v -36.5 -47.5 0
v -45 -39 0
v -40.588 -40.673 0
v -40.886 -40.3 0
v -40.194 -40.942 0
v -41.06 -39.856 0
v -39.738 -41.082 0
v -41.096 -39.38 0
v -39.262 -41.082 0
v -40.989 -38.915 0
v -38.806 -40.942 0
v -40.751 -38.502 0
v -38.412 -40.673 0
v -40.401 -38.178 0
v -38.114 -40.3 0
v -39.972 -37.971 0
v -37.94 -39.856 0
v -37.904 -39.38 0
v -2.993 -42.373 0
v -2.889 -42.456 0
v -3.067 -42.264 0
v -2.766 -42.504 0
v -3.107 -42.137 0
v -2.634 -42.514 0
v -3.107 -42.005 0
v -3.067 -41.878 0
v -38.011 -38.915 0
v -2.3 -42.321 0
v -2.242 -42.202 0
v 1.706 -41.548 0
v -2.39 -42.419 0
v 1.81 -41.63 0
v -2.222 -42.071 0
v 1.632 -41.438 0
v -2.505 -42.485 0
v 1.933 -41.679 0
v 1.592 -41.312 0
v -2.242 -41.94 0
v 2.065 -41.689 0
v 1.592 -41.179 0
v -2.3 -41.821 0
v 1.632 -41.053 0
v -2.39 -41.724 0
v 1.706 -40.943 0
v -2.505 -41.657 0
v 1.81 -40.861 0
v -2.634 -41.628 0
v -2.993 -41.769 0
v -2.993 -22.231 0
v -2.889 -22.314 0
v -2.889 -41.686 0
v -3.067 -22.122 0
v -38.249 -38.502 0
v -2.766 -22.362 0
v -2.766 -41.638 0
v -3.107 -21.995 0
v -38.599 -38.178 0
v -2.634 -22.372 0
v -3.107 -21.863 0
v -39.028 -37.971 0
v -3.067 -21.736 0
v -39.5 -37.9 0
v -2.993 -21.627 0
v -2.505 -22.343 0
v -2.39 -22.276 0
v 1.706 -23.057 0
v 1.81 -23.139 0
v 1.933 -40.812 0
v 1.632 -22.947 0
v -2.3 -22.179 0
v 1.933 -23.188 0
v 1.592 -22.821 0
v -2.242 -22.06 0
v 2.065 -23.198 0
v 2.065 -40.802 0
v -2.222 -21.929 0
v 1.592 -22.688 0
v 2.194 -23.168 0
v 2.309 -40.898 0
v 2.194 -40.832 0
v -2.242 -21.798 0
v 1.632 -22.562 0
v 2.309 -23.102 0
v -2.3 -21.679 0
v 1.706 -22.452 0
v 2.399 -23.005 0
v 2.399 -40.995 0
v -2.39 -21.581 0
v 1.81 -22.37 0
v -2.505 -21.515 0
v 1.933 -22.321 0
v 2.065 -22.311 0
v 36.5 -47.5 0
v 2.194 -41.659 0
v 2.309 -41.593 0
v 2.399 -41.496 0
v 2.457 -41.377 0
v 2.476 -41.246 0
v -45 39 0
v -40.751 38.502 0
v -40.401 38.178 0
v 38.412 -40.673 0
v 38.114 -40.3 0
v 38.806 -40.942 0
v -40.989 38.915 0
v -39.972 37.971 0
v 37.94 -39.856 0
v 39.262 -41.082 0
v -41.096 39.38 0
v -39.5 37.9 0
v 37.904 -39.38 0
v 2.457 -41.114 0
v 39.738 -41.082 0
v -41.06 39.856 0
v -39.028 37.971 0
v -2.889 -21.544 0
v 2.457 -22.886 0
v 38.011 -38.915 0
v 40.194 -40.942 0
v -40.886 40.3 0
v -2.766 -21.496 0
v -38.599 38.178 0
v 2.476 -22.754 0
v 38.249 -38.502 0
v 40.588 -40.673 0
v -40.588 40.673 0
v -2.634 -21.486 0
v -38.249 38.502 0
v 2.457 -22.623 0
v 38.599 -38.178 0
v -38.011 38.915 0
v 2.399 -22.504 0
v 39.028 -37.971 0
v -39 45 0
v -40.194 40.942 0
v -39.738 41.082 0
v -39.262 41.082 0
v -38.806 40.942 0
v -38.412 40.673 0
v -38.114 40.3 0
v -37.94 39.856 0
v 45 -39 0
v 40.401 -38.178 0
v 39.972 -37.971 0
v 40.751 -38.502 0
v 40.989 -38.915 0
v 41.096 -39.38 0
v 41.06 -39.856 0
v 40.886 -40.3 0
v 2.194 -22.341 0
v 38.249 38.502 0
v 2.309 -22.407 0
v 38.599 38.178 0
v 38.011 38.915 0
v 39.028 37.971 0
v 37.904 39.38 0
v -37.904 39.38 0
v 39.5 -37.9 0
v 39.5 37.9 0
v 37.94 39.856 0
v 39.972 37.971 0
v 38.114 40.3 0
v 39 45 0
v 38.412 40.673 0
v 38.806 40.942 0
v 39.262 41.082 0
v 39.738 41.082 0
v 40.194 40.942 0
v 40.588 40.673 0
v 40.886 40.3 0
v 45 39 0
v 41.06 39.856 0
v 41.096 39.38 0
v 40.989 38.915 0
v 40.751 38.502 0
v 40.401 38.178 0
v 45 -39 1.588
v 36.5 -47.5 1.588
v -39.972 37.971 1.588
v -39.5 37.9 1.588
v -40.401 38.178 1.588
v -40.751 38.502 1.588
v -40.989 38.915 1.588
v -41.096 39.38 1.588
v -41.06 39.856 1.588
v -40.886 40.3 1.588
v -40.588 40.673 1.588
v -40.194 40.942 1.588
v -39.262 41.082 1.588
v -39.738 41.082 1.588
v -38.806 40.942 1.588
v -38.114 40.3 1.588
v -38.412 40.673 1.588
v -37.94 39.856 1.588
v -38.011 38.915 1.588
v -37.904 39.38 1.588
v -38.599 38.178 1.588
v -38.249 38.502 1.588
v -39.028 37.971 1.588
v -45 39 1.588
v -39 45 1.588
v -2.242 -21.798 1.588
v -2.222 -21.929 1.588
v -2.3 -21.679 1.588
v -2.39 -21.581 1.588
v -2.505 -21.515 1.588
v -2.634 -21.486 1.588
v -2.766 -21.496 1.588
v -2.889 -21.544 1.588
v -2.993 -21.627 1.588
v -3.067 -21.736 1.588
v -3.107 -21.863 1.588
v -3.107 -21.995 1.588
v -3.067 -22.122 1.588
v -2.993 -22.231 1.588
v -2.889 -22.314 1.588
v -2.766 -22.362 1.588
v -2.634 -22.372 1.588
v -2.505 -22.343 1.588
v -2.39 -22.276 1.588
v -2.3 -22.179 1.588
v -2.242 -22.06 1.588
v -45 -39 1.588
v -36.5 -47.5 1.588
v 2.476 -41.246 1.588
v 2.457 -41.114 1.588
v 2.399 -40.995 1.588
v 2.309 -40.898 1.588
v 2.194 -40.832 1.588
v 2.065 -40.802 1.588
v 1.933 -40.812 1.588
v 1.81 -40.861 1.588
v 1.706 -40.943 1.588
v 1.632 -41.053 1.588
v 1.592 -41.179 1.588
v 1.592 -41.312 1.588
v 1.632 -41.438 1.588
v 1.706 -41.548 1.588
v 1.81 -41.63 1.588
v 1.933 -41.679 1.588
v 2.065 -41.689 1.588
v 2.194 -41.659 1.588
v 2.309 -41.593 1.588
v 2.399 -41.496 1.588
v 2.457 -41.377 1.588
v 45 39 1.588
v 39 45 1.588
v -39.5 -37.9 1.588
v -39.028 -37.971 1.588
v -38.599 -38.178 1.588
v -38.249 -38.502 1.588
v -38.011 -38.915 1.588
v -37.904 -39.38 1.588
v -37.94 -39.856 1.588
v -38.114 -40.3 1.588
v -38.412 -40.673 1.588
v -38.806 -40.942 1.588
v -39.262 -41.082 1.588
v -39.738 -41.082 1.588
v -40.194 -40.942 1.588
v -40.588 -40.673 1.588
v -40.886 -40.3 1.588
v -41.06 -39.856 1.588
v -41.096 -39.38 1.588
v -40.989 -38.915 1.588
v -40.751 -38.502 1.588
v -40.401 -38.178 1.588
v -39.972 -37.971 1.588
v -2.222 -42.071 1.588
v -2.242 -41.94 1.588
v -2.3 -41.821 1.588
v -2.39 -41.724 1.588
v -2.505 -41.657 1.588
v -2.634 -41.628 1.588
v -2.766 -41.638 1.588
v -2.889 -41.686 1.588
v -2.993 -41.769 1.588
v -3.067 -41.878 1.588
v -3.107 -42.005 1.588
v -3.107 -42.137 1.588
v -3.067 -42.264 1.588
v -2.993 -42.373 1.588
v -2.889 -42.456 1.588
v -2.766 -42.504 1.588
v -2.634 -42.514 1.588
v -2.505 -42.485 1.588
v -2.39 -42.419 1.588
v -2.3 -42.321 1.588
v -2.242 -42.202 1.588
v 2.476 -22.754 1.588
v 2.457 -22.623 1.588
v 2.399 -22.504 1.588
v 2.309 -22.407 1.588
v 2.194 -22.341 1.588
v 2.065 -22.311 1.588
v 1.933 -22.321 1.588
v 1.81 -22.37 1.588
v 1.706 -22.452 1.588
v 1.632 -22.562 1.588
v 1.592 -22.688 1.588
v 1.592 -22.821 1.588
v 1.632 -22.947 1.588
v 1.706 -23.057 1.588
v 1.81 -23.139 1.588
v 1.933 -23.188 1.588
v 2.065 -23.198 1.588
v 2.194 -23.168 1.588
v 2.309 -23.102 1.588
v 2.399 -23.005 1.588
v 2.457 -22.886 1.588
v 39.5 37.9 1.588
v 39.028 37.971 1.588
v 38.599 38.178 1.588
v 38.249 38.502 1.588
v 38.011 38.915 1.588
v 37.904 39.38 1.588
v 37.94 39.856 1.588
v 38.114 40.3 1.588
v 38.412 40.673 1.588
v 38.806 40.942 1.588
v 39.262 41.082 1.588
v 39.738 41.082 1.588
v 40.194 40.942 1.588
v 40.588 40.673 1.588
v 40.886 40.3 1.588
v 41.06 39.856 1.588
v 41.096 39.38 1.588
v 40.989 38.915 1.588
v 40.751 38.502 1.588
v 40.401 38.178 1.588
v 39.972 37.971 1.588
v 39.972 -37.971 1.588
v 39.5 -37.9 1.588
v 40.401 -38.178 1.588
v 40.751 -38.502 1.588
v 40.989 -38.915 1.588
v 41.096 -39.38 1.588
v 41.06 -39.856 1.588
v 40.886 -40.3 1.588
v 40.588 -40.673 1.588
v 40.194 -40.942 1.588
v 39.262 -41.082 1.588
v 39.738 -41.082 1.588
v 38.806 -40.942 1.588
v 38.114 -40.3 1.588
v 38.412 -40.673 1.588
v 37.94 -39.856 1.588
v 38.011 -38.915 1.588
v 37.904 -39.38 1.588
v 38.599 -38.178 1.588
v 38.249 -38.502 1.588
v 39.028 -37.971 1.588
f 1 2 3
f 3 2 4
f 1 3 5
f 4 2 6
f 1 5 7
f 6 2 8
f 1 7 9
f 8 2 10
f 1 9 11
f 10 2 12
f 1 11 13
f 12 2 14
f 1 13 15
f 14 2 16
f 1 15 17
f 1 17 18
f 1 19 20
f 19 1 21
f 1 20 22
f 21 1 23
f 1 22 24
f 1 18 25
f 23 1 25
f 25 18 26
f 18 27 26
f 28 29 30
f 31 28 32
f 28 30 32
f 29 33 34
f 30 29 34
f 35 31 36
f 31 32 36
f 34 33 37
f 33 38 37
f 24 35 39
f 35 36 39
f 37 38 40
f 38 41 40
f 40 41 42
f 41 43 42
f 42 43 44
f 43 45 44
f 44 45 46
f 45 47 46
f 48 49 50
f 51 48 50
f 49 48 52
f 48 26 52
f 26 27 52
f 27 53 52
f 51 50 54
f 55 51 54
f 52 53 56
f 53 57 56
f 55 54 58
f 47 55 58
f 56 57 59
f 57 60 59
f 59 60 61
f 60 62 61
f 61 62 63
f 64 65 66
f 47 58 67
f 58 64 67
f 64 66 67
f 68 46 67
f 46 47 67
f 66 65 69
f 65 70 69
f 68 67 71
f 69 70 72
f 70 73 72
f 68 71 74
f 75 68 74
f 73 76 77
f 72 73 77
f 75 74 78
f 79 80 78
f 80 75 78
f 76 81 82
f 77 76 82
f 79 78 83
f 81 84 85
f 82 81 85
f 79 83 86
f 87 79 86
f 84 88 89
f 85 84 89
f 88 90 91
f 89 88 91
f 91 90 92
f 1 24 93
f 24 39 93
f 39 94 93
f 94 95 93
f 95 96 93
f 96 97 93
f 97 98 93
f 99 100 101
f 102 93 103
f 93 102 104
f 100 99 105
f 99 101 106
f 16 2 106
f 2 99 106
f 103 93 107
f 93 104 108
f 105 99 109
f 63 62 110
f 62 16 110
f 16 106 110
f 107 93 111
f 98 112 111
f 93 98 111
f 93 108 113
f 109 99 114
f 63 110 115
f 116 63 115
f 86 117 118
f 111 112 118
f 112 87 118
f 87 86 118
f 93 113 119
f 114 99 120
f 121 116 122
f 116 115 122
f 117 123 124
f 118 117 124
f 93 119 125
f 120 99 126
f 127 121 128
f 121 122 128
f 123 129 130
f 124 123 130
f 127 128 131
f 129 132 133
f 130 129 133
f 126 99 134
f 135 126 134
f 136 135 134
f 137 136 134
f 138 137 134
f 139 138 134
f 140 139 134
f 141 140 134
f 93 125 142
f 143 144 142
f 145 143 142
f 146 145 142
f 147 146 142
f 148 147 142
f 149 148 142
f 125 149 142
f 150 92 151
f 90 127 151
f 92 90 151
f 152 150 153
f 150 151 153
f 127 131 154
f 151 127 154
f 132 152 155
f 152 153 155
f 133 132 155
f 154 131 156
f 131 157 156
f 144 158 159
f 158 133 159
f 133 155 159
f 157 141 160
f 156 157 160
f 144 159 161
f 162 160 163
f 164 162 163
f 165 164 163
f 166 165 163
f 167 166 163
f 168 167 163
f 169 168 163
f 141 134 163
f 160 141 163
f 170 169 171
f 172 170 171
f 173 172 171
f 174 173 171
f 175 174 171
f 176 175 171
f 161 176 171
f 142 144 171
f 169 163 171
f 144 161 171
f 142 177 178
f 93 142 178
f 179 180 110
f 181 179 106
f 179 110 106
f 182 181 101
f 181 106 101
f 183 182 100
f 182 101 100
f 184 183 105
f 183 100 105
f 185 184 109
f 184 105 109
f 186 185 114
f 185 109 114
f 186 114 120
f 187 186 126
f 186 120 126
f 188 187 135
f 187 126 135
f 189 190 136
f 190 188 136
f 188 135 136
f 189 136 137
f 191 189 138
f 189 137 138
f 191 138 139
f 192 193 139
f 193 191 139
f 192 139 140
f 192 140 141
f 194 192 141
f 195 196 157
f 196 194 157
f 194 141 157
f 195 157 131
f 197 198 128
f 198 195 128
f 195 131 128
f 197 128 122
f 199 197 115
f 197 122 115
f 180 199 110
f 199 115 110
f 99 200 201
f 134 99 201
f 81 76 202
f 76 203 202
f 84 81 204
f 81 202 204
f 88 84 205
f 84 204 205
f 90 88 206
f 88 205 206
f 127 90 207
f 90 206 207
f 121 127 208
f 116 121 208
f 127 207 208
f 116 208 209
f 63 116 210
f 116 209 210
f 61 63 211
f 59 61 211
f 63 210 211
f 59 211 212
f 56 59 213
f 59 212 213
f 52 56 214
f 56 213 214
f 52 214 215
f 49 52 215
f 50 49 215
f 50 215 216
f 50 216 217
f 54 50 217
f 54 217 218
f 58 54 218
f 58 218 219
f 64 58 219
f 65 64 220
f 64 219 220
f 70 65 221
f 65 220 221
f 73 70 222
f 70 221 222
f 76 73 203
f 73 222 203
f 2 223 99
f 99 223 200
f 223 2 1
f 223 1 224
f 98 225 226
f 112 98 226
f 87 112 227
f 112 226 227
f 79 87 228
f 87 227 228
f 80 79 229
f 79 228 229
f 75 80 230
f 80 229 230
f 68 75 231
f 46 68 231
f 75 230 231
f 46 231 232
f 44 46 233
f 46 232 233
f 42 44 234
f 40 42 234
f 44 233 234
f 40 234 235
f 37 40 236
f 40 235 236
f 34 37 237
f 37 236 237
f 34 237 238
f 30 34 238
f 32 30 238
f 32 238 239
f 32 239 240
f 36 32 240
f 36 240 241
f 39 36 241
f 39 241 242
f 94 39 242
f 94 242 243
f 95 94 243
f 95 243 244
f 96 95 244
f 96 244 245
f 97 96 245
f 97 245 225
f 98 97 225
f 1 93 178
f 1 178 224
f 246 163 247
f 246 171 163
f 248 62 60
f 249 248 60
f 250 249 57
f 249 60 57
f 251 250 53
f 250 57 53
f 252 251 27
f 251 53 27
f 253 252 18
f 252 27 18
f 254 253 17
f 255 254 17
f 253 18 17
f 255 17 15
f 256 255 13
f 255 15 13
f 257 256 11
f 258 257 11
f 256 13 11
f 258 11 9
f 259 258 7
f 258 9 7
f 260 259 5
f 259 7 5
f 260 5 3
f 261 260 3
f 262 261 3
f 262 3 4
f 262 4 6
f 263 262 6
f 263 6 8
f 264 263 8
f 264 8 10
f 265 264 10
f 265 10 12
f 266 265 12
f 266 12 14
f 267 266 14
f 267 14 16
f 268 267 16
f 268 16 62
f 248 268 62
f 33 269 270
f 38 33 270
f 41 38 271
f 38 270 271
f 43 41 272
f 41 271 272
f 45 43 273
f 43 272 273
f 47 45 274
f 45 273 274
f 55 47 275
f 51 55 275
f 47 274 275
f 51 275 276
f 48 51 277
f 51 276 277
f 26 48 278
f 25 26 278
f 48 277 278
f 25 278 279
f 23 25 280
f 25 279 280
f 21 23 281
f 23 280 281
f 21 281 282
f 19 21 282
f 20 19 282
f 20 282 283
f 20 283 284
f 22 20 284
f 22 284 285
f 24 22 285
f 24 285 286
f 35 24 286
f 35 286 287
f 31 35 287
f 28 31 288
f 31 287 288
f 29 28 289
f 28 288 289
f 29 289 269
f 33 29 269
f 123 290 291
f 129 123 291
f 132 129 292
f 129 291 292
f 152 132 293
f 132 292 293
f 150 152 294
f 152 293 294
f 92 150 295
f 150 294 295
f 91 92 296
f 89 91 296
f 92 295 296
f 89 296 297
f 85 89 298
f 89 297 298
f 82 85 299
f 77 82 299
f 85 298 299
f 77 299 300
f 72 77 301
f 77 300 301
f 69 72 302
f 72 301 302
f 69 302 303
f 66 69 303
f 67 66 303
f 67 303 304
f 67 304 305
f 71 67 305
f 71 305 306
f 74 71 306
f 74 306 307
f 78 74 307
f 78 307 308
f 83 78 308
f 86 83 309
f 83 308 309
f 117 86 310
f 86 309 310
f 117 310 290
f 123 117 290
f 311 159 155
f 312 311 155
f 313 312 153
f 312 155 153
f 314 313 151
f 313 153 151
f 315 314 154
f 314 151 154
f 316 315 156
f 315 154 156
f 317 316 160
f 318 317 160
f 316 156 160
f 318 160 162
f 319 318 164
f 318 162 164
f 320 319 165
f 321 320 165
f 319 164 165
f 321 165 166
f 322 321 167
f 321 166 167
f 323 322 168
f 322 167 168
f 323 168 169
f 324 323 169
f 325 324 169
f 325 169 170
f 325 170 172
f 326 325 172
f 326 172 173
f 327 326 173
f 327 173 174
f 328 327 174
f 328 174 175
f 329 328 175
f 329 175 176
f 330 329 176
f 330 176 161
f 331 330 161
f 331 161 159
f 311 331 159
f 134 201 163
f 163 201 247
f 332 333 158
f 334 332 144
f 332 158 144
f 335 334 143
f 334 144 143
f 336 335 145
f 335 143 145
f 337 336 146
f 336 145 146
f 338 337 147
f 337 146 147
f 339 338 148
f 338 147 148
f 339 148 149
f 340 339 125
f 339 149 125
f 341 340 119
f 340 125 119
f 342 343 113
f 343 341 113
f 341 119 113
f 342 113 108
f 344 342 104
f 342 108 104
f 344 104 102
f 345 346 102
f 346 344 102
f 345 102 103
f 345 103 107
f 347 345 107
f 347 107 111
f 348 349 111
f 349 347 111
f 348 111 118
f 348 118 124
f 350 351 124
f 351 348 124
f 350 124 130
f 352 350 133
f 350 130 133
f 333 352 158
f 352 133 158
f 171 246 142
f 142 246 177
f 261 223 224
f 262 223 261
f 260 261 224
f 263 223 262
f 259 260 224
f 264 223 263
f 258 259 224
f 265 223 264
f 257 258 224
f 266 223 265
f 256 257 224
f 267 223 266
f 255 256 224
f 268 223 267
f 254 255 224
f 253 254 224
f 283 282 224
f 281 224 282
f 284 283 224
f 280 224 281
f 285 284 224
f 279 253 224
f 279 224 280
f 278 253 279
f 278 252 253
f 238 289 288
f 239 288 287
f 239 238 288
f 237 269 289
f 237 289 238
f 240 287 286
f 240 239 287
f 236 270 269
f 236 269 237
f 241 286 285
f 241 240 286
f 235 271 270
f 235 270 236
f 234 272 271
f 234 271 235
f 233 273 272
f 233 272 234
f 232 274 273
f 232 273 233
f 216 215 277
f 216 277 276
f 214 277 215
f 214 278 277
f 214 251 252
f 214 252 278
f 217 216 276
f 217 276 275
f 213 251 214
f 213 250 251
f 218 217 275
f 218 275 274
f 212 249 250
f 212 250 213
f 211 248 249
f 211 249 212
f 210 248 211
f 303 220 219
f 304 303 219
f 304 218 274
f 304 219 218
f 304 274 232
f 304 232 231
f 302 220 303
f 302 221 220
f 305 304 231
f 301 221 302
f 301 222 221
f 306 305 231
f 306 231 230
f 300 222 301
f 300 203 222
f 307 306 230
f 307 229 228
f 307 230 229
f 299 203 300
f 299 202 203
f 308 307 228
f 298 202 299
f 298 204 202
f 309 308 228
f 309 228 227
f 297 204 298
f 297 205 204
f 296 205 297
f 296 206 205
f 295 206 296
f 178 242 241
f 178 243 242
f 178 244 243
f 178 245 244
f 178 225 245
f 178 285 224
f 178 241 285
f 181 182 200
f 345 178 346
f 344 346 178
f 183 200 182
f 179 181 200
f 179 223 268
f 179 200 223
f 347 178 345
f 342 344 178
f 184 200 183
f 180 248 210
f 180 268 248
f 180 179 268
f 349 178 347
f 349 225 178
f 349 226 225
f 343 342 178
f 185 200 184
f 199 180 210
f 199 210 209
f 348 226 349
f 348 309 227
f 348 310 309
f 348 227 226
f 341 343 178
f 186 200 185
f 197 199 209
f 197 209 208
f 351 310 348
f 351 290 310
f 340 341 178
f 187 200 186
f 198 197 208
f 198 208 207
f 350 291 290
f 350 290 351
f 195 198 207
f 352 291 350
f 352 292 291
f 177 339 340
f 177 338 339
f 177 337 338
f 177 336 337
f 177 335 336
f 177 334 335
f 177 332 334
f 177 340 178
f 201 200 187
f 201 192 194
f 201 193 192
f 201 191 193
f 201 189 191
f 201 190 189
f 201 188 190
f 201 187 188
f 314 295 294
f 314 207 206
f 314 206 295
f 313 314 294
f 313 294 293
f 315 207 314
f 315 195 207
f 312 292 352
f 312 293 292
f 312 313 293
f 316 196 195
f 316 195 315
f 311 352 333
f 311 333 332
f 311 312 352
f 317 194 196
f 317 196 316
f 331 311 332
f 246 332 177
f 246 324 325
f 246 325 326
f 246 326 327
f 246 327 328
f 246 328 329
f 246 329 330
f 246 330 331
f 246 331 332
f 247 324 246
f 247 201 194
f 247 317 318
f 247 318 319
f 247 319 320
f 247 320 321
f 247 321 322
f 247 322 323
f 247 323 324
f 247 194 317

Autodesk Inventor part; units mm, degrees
sketch "AL_spacer_contact_Zminus" plane through (0, 0, 0) normal (0, 0, 1) x (1, 0, 0)
  circle A0 centre (39.5, 39.5) radius 3.175
  circle A1 centre (39.5, -39.5) radius 3.175
  circle A2 centre (-39.5, -39.5) radius 3.175
  circle A3 centre (-39.5, 39.5) radius 3.175
  point P0 (0, 0)
  dimension "d228" = 39.5
  dimension "d229" = 39.5
  dimension "d230" = 39.5
  dimension "d231" = 39.5
  dimension "d232" = 39.5
  dimension "d233" = 39.5
  dimension "d234" = 39.5
  dimension "d235" = 39.5
  dimension "d236" = 6.35
sketch "Delrin_stayout_Zminus" plane through (0, 0, 0) normal (0, 0, 1) x (1, 0, 0)
  line L0 (47.5, 39.5) -> (47.5, 31)
  line L1 (47.5, 31) -> (39.5, 31)
  line L2 (39.5, 31) -> (31, 39.5)
  line L3 (31, 39.5) -> (31, 47.5)
  line L4 (31, 47.5) -> (39.5, 47.5)
  line L5 (39.5, 47.5) -> (47.5, 39.5)
  line L6 (-39.5, 47.5) -> (-47.5, 39.5)
  line L7 (-47.5, 39.5) -> (-47.5, 31)
  line L8 (-47.5, 31) -> (-39.5, 31)
  line L9 (-39.5, 31) -> (-31, 39.5)
  line L10 (-31, 39.5) -> (-31, 47.5)
  line L11 (-31, 47.5) -> (-39.5, 47.5)
  line L12 (47.5, -39.5) -> (39.5, -47.5)
  line L13 (39.5, -47.5) -> (31, -47.5)
  line L14 (31, -47.5) -> (31, -39.5)
  line L15 (31, -39.5) -> (39.5, -31)
  line L16 (39.5, -31) -> (47.5, -31)
  line L17 (47.5, -31) -> (47.5, -39.5)
  line L18 (-39.5, -47.5) -> (-47.5, -39.5)
  line L19 (-47.5, -39.5) -> (-47.5, -31)
  line L20 (-47.5, -31) -> (-39.5, -31)
  line L21 (-39.5, -31) -> (-31, -39.5)
  line L22 (-31, -39.5) -> (-31, -47.5)
  line L23 (-31, -47.5) -> (-39.5, -47.5)
  point P0 (0, 0)
  dimension "d243" = 16.5
  dimension "d244" = 8
  dimension "d245" = 8.5
  dimension "d246" = 16.5
  dimension "d247" = 47.5
  dimension "d248" = 47.5
  dimension "d249" = 47.5
  dimension "d250" = 47.5
  dimension "d251" = 47.5
  dimension "d252" = 47.5
  dimension "d253" = 47.5
  dimension "d254" = 47.5
sketch "Nub_stayout_Zminus" plane through (0, 0, 0) normal (0, 0, 1) x (1, 0, 0)
  line L0 (29, 47.5) -> (39.5, 47.5)
  line L1 (39.5, 47.5) -> (47.5, 39.5)
  line L2 (47.5, 39.5) -> (47.5, 29)
  line L3 (47.5, 29) -> (42, 29)
  line L4 (42, 29) -> (42, 40.4125)
  line L5 (40.4125, 42) -> (29, 42)
  line L6 (29, 42) -> (29, 47.5)
  arc A0 (42, 40.4125) -> (40.4125, 42) centre (40.4125, 40.4125) ccw
  line L7 (-29, 47.5) -> (-39.5, 47.5)
  line L8 (-39.5, 47.5) -> (-47.5, 39.5)
  line L9 (-47.5, 39.5) -> (-47.5, 29)
  line L10 (-47.5, 29) -> (-42, 29)
  line L11 (-42, 29) -> (-42, 40.4125)
  line L12 (-40.4125, 42) -> (-29, 42)
  line L13 (-29, 42) -> (-29, 47.5)
  arc A1 (-40.4125, 42) -> (-42, 40.4125) centre (-40.4125, 40.4125) ccw
  line L14 (-47.5, -29) -> (-42, -29)
  line L15 (-42, -29) -> (-42, -40.4125)
  line L16 (-40.4125, -42) -> (-29, -42)
  line L17 (-29, -42) -> (-29, -47.5)
  line L18 (-29, -47.5) -> (-39.5, -47.5)
  line L19 (-39.5, -47.5) -> (-47.5, -39.5)
  line L20 (-47.5, -39.5) -> (-47.5, -29)
  arc A2 (-42, -40.4125) -> (-40.4125, -42) centre (-40.4125, -40.4125) ccw
  line L21 (47.5, -29) -> (42, -29)
  line L22 (42, -29) -> (42, -40.4125)
  line L23 (40.4125, -42) -> (29, -42)
  line L24 (29, -42) -> (29, -47.5)
  line L25 (29, -47.5) -> (39.5, -47.5)
  line L26 (39.5, -47.5) -> (47.5, -39.5)
  line L27 (47.5, -39.5) -> (47.5, -29)
  arc A3 (40.4125, -42) -> (42, -40.4125) centre (40.4125, -40.4125) ccw
  point P0 (0, 0)
  dimension "d255" = 1.5875
  dimension "d256" = 18.5
  dimension "d257" = 8
  dimension "d258" = 5.5
  dimension "d259" = 47.5
  dimension "d260" = 47.5
  dimension "d264" = 1.5875
  dimension "d265" = 47.5
  dimension "d266" = 47.5
  dimension "d267" = 1.5875
  dimension "d268" = 47.5
  dimension "d269" = 47.5
  dimension "d270" = 1.5875
  dimension "d271" = 47.5
  dimension "d272" = 47.5
ref_plane "Zplus_face" through (0, 0, 1.5875) normal (0, 0, 1) x (1, 0, 0)
sketch "AL_spacer_contact_Zplus" plane through (0, 0, 1.5875) normal (0, 0, 1) x (1, 0, 0)
  circle A0 centre (-39.5, 39.5) radius 3.175
  circle A1 centre (-39.5, -39.5) radius 3.175
  circle A2 centre (39.5, -39.5) radius 3.175
  circle A3 centre (39.5, 39.5) radius 3.175
  point P0 (0, 0)
  dimension "d129" = 39.5
  dimension "d130" = 39.5
  dimension "d131" = 39.5
  dimension "d132" = 39.5
  dimension "d133" = 6.35
sketch "Delrin_stayout_Zplus" plane through (0, 0, 1.5875) normal (0, 0, 1) x (1, 0, 0)
  line L0 (47.5, -31) -> (47.5, -39.5)
  line L1 (47.5, -39.5) -> (39.5, -47.5)
  line L2 (39.5, -47.5) -> (31, -47.5)
  line L3 (31, -47.5) -> (31, -39.5)
  line L4 (31, -39.5) -> (39.5, -31)
  line L5 (39.5, -31) -> (47.5, -31)
  line L6 (47.5, 31) -> (47.5, 39.5)
  line L7 (47.5, 39.5) -> (39.5, 47.5)
  line L8 (39.5, 47.5) -> (31, 47.5)
  line L9 (31, 47.5) -> (31, 39.5)
  line L10 (31, 39.5) -> (39.5, 31)
  line L11 (39.5, 31) -> (47.5, 31)
  line L12 (-39.5, 47.5) -> (-47.5, 39.5)
  line L13 (-47.5, 39.5) -> (-47.5, 31)
  line L14 (-47.5, 31) -> (-39.5, 31)
  line L15 (-39.5, 31) -> (-31, 39.5)
  line L16 (-31, 39.5) -> (-31, 47.5)
  line L17 (-31, 47.5) -> (-39.5, 47.5)
  line L18 (-47.5, -39.5) -> (-39.5, -47.5)
  line L19 (-39.5, -47.5) -> (-31, -47.5)
  line L20 (-31, -47.5) -> (-31, -39.5)
  line L21 (-31, -39.5) -> (-39.5, -31)
  line L22 (-39.5, -31) -> (-47.5, -31)
  line L23 (-47.5, -31) -> (-47.5, -39.5)
  point P0 (0, 0)
  dimension "d115" = 16.5
  dimension "d116" = 16.5
  dimension "d117" = 8
  dimension "d118" = 8.5
  dimension "d121" = 47.5
  dimension "d122" = 47.5
  dimension "d123" = 47.5
  dimension "d124" = 47.5
  dimension "d125" = 47.5
  dimension "d126" = 47.5
  dimension "d127" = 47.5
  dimension "d128" = 47.5
sketch "Nub_stayout_Zplus" plane through (0, 0, 1.5875) normal (0, 0, 1) x (1, 0, 0)
  line L0 (47.5, 29) -> (42, 29)
  line L1 (42, 29) -> (42, 40.4125)
  line L2 (40.4125, 42) -> (29, 42)
  line L3 (29, 42) -> (29, 47.5)
  arc A0 (42, 40.4125) -> (40.4125, 42) centre (40.4125, 40.4125) ccw
  line L4 (29, 47.5) -> (39.5, 47.5)
  line L5 (39.5, 47.5) -> (47.5, 39.5)
  line L6 (47.5, 39.5) -> (47.5, 29)
  line L7 (-39.5, 47.5) -> (-29, 47.5)
  line L8 (-29, 47.5) -> (-29, 42)
  line L9 (-29, 42) -> (-40.4125, 42)
  line L10 (-42, 40.4125) -> (-42, 29)
  line L11 (-42, 29) -> (-47.5, 29)
  line L12 (-47.5, 29) -> (-47.5, 39.5)
  line L13 (-47.5, 39.5) -> (-39.5, 47.5)
  arc A1 (-40.4125, 42) -> (-42, 40.4125) centre (-40.4125, 40.4125) ccw
  line L14 (-47.5, -29) -> (-47.5, -39.5)
  line L15 (-47.5, -39.5) -> (-39.5, -47.5)
  line L16 (-39.5, -47.5) -> (-29, -47.5)
  line L17 (-29, -47.5) -> (-29, -42)
  line L18 (-29, -42) -> (-40.4125, -42)
  line L19 (-42, -40.4125) -> (-42, -29)
  line L20 (-42, -29) -> (-47.5, -29)
  arc A2 (-42, -40.4125) -> (-40.4125, -42) centre (-40.4125, -40.4125) ccw
  line L21 (29, -47.5) -> (39.5, -47.5)
  line L22 (39.5, -47.5) -> (47.5, -39.5)
  line L23 (47.5, -39.5) -> (47.5, -29)
  line L24 (47.5, -29) -> (42, -29)
  line L25 (42, -29) -> (42, -40.4125)
  line L26 (40.4125, -42) -> (29, -42)
  line L27 (29, -42) -> (29, -47.5)
  arc A3 (40.4125, -42) -> (42, -40.4125) centre (40.4125, -40.4125) ccw
  point P0 (0, 0)
  dimension "d146" = 1.5875
  dimension "d147" = 5.5
  dimension "d149" = 18.5
  dimension "d150" = 8
  dimension "d151" = 47.5
  dimension "d152" = 47.5
  dimension "d153" = 1.5875
  dimension "d154" = 47.5
  dimension "d155" = 47.5
  dimension "d156" = 1.5875
  dimension "d157" = 47.5
  dimension "d158" = 47.5
  dimension "d159" = 1.5875
  dimension "d160" = 47.5
  dimension "d161" = 47.5
sketch "Sketch1" plane through (0, 0, 0) normal (0, 0, 1) x (1, 0, 0)
  line L0 (-47.5, 47.5) -> (47.5, 47.5)
  line L1 (47.5, 47.5) -> (47.5, -47.5)
  line L2 (47.5, -47.5) -> (-47.5, -47.5)
  line L3 (-47.5, -47.5) -> (-47.5, 47.5)
  point P0 (0, 0)
  dimension "d0" = 95
  dimension "d1" = 95
  dimension "d2" = 47.5
  dimension "d3" = 47.5
extrude "Extrusion1" add sketch "Sketch1" along normal blind 1.5875
chamfer "Chamfer2" distance 11 angle 45 2 edges at (-47.5, -47.5, 0.7937) (47.5, 47.5, 0.7937)
ref_plane "Work Plane_ConnX" through (-32, 0, 0) normal (1, 0, 0) x (0, 1, 0)
ref_plane "Work Plane_ConnY" through (0, 0, 0) normal (0, 1, 0) x (-1, 0, 0)
sketch "Sketch9" plane through (0, 0, 1.5875) normal (0, 0, 1) x (1, 0, 0)
  line L0 (47.5, 47.5) -> (47.5, -47.5) projected
  line L1 (58.5598, -32) -> (-58.5598, -32)
  circle A0 centre (-2.667, -21.9289) radius 0.4445
  circle A1 centre (-2.667, -42.0711) radius 0.4445
  line L2 (0, 26.5598) -> (0, -90.5598) construction
  point P0 (0, 0)
  point P1 (0, -32)
  dimension "d134" = 20.1422
  dimension "d136" = 2.667
  dimension "d138" = 0.889
  dimension "d141" = 180
  dimension "d350" = 32
  dimension "d351" = 0
extrude "Holes_Conn_Zminus" cut sketch "Sketch9" against normal through all
sketch "Sketch22" plane through (0, 0, 1.5875) normal (0, 0, 1) x (1, 0, 0)
  line L0 (47.5, 36.5) -> (47.5, -47.5) projected
  line L1 (0, -1.0026) -> (0, -62.9974) construction
  line L2 (62.8115, -32) -> (-62.8115, -32)
  circle A0 centre (2.032, -22.7545) radius 0.4445
  circle A1 centre (2.032, -41.2455) radius 0.4445
  point P0 (47.5, -36.5)
  point P1 (0, 0)
  point P2 (0, -32)
  dimension "d282" = 180
  dimension "d283" = 18.491
  dimension "d284" = 0.889
  dimension "d285" = 2.032
  dimension "d352" = 32
  dimension "d353" = 0
extrude "Holes_Conn_Zplus" cut sketch "Sketch22" against normal through all
hole "Hole5" at (39.5, 39.5, 1.5875) direction (0, 0, -1) diameter 3.2 end through all
mirror "Mirror5" about plane through (0, 0, 0) normal (1, 0, 0) of "Hole5"
mirror "Mirror6" about plane through (0, 0, 0) normal (0, 1, 0) of "Hole5", "Mirror5"
sketch "Sketch25" plane through (0, 0, 1.5875) normal (0, 0, 1) x (1, 0, 0)
  circle A0 centre (-39.5, -39.5) radius 1.6 projected
  circle A1 centre (39.5, -39.5) radius 1.6 projected
  circle A2 centre (-39.5, 39.5) radius 1.6 projected
  circle A3 centre (39.5, 39.5) radius 1.6 projected
  line L0 (47.5, -47.5) -> (-36.5, -47.5) projected
  line L1 (0, 0) -> (0, -59.2198)
  line L2 (8, -47.5) -> (8, -15.5)
  line L3 (8, -15.5) -> (-8, -15.5)
  line L4 (-8, -15.5) -> (-8, -47.5)
  line L5 (-8, -47.5) -> (-62.7516, -61.7336)
  line L6 (-62.7516, -61.7336) -> (-64.2933, 68.2222)
  line L7 (-64.2933, 68.2222) -> (58.3572, 62.5728)
  line L8 (58.3572, 62.5728) -> (56.5848, -69.017)
  line L9 (56.5848, -69.017) -> (8, -47.5)
  point P0 (36.5, -47.5)
  dimension "d362" = 16
  dimension "d363" = 32
extrude "Extrusion9" [suppressed]
sketch "Sketch26" plane through (0, 0, 1.5875) normal (0, 0, 1) x (1, 0, 0)
  line L0 (47.5, -47.5) -> (-36.5, -47.5) projected
  circle A0 centre (-23.5, -42.5) radius 0.75
  circle A1 centre (-16.5, -42.5) radius 0.75
  line L1 (-20, -36.5) -> (-20, -45.5063)
  point P0 (36.5, -47.5)
  point P1 (0, 0)
  point P2 (-20, -42.5)
  dimension "d366" = 1.5
  dimension "d367" = 7
  dimension "d368" = 5
  dimension "d369" = 20
extrude "Extrusion10" [suppressed]
sketch "Sketch27" plane through (0, 0, 1.5875) normal (0, 0, 1) x (1, 0, 0)
  line L0 (47.5, -47.5) -> (47, -47.5)
  line L1 (47, -47.5) -> (47, -40.5)
  line L2 (47.5, -39.338) -> (47.5, -47.5)
  arc A0 (47.5, -39.338) -> (47, -40.5) centre (48.6002, -40.5) ccw
  line L3 (-47.5, 47.5) -> (-47, 47.5)
  line L4 (-47, 47.5) -> (-47, 40.5)
  line L5 (-47.5, 39.338) -> (-47.5, 47.5)
  arc A1 (-47.5, 39.338) -> (-47, 40.5) centre (-48.6002, 40.5) ccw
  point P0 (0, 0)
  dimension "d372" = 1.6002
  dimension "d373" = 0.5
  dimension "d374" = 7
extrude "Extrusion11" cut sketch "Sketch27" against normal through all
chamfer "Chamfer4" [suppressed]
sketch "Sketch33" plane through (0, 0, 1.5875) normal (0, 0, 1) x (1, 0, 0)
  circle A0 centre (-44.75, 44.75) radius 1.5875
  circle A1 centre (44.75, -44.75) radius 1.5875
  line L0 (6.3245, 0) -> (0, 0)
  line L1 (0, 0) -> (0, 6.5529)
  circle A2 centre (-44.75, -44.75) radius 1.5875
  circle A3 centre (44.75, 44.75) radius 1.5875
  dimension "d431" = 89.5
  dimension "d432" = 89.5
  dimension "d433" = 89.5
  dimension "d434" = 89.5
  dimension "d435" = 3.175
extrude "Extrusion13" [suppressed]
sketch "Sketch34" plane through (0, 0, 1.5875) normal (0, 0, 1) x (1, 0, 0)
  arc A0 (-47.5, 39.338) -> (-47, 40.5) centre (-48.6002, 40.5) ccw projected
  line L0 (-47.5, -36.5) -> (-47.5, 39.338) projected
  line L1 (47, -47.5) -> (-36.5, -47.5) projected
  line L2 (47, -47.5) -> (47, -40.5) projected
  arc A1 (47.5, -39.338) -> (47, -40.5) centre (48.6002, -40.5) ccw projected
  line L3 (47.5, 36.5) -> (47.5, -39.338) projected
  line L4 (-47, 47.5) -> (-47, 40.5) projected
  line L5 (-47.5, 36.5) -> (-36.5, 47.5)
  line L6 (-47.5, 36.5) -> (-47.5, 47.5)
  line L7 (-47.5, 47.5) -> (-36.5, 47.5)
  line L8 (47.5, -36.5) -> (36.5, -47.5)
  line L9 (47.5, -47.5) -> (47.5, -36.5)
  line L10 (36.5, -47.5) -> (47.5, -47.5)
  point P0 (0, 0)
  dimension "d438" = 11
  dimension "d439" = 11
extrude "Extrusion14" cut sketch "Sketch34" against normal through all contours L6 L7 L4 A0 | A0 L4 L7 L5 L0 | L1 L8 L3 A1 L2
sketch "Sketch35" plane through (0, 0, 1.5875) normal (0, 0, 1) x (1, 0, 0)
  line L0 (36.5, -47.5) -> (47.5, -36.5) projected
  line L1 (47.5, 36.5) -> (47.5, -39.338) projected
  line L2 (36.5, 47.5) -> (47.5, 36.5) projected
  line L3 (-47, 47.5) -> (36.5, 47.5) projected
  line L4 (-36.5, 47.5) -> (-47.5, 36.5) projected
  line L5 (-47.5, -36.5) -> (-47.5, 39.338) projected
  line L6 (-36.5, -47.5) -> (-47.5, -36.5) projected
  line L7 (-45, -39) -> (-45, 39)
  line L8 (-39, 45) -> (39, 45)
  line L9 (45, 39) -> (45, -39)
  point P0 (0, 0)
  dimension "d442" = 45
  dimension "d443" = 45
  dimension "d444" = 45
extrude "Extrusion15" cut sketch "Sketch35" against normal through all
sketch "Sketch36" plane through (0, 0, 1.5875) normal (0, 0, 1) x (1, 0, 0)
  line L0 (47.5, 36.5) -> (47.5, -39.338) projected
  line L1 (-47, 47.5) -> (36.5, 47.5) projected
  line L2 (-47.5, -36.5) -> (-47.5, 39.338) projected
  line L3 (-47.5, 27.5) -> (-45, 27.5)
  line L4 (-45, 27.5) -> (-45, 43)
  line L5 (-45, 43) -> (-47.5, 43)
  line L6 (-47.5, 43) -> (-47.5, 27.5)
  line L7 (-27.5, 47.5) -> (-44, 47.5)
  line L8 (-44, 47.5) -> (-44, 45)
  line L9 (-44, 45) -> (-27.5, 45)
  line L10 (-27.5, 45) -> (-27.5, 47.5)
  line L11 (27.5, 47.5) -> (44, 47.5)
  line L12 (44, 47.5) -> (44, 45)
  line L13 (44, 45) -> (27.5, 45)
  line L14 (27.5, 45) -> (27.5, 47.5)
  line L15 (47.5, 27.5) -> (45, 27.5)
  line L16 (45, 27.5) -> (45, 45.2)
  line L17 (45, 45.2) -> (47.5, 45.2)
  line L18 (47.5, 45.2) -> (47.5, 27.5)
  point P0 (47.5, -36.5)
  point P1 (-36.5, 47.5)
  point P2 (-47.5, 36.5)
  point P3 (0, 0)
  dimension "d447" = 20
  dimension "d448" = 20
  dimension "d449" = 20
  dimension "d450" = 20
  dimension "d451" = 2.5
extrude "Extrusion16" [suppressed]
sketch "Sketch37" plane through (0, 0, 1.5875) normal (0, 0, 1) x (1, 0, 0)
  line L0 (39, 45) -> (-39, 45) projected
  line L1 (-45, 39) -> (-45, -39) projected
  line L2 (36.5, -47.5) -> (-36.5, -47.5) projected
  line L3 (45, -39) -> (45, 39) projected
  line L4 (-45, 45) -> (44.9827, 45.0169) construction
  line L5 (44.9827, 45.0169) -> (45, -47.5) construction
  line L6 (45, -47.5) -> (-44.9827, -47.5169) construction
  line L7 (-44.9827, -47.5169) -> (-45, 45) construction
  point P0 (0, 0)
decal "Decal4"
sketch "Sketch39" plane through (0, 0, 0) normal (0, 0, -1) x (-1, 0, 0)
  line L0 (39, 45) -> (-39, 45) projected
  line L1 (-45, 39) -> (-45, -39) projected
  line L2 (-36.5, -47.5) -> (36.5, -47.5) projected
  line L3 (45, -39) -> (45, 39) projected
  line L4 (-45, 45) -> (44.9779, 45.0215) construction
  line L5 (44.9779, 45.0215) -> (45, -47.5) construction
  line L6 (45, -47.5) -> (-44.9779, -47.5215) construction
  line L7 (-44.9779, -47.5215) -> (-45, 45) construction
  point P0 (0, 0)
decal "Decal5"
equation "\"DESCRIPTION\" = 0.1"
properties part number "PCB_LT_ICR-EM" material "FR4"
